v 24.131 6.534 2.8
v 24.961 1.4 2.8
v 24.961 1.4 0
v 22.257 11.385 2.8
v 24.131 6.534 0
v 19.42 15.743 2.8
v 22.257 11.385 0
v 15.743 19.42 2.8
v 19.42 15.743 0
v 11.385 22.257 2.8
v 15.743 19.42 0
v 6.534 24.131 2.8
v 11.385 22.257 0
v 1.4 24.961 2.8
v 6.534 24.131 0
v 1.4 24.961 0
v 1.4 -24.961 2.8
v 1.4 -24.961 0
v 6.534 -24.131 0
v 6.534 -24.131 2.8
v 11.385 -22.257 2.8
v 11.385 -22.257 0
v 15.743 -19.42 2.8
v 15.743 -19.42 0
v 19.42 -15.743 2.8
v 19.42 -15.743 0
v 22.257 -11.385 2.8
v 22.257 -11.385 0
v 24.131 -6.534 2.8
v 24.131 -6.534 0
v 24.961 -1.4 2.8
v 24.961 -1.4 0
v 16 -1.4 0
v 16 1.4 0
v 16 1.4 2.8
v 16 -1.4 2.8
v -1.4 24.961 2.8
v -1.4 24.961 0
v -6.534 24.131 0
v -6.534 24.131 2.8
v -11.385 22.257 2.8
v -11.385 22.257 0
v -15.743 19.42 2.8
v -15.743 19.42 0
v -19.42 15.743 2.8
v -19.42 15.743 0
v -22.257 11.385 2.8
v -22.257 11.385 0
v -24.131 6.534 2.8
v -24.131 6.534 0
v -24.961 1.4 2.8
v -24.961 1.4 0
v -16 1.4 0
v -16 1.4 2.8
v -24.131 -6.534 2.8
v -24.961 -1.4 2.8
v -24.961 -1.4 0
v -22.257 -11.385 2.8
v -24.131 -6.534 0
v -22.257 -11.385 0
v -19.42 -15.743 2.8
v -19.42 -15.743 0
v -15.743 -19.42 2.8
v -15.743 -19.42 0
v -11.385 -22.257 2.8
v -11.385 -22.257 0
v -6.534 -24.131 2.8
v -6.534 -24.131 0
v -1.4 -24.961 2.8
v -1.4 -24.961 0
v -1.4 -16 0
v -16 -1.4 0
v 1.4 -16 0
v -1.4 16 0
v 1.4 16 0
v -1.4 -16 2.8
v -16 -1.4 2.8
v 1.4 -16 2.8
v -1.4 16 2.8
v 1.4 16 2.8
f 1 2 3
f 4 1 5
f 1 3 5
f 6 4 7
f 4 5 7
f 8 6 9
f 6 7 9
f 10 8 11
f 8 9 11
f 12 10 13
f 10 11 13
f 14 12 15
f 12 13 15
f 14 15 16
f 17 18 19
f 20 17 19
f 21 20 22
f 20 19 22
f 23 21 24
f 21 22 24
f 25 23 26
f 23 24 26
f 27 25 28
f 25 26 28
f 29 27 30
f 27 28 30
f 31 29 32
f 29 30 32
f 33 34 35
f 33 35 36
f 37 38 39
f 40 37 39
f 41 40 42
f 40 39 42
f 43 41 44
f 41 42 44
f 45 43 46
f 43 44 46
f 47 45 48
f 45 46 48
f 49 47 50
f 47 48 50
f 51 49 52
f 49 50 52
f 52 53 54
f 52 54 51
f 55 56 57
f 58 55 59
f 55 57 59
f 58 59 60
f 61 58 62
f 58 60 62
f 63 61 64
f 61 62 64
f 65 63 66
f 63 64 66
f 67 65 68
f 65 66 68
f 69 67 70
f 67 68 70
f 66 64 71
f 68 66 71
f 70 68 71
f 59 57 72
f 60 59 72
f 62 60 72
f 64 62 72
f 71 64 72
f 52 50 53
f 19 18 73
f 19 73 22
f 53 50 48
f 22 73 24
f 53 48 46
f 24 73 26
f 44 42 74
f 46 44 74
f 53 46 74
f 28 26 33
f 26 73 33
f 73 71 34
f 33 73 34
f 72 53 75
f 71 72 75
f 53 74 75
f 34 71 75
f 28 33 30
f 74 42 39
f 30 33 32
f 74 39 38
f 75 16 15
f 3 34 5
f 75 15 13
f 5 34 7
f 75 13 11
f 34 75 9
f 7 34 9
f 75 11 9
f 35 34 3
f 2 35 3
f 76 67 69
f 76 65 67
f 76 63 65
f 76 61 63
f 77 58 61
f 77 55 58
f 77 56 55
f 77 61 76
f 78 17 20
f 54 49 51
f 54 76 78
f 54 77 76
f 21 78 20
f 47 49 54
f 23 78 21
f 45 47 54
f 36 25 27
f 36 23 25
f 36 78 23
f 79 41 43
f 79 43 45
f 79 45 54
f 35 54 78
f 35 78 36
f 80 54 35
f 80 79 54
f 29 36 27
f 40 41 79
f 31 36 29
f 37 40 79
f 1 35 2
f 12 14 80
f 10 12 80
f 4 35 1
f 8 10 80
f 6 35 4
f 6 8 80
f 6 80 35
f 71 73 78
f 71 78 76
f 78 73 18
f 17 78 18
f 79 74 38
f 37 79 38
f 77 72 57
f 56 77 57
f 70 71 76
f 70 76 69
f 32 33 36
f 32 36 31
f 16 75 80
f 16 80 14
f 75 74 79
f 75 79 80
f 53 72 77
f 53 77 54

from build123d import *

# Parameters (mm, degrees)
CROQUIS1_R              = 25
SALIENTE_EXTRUIR1_DEPTH = 2.8
CROQUIS2_W              = 2.8
CROQUIS2_H              = 18
CORTAR_EXTRUIR1_DEPTH   = 3.8
MATRIZC1_COUNT          = 4


with BuildPart() as part:
    # Croquis1 → Saliente-Extruir1 (new body)
    with BuildSketch(Plane.XY):
        Circle(CROQUIS1_R)
    extrude(amount=SALIENTE_EXTRUIR1_DEPTH)

    # Croquis2 → Cortar-Extruir1 (cut, through all)
    with BuildSketch(Plane.XY):
        with Locations((0, 25)):
            Rectangle(CROQUIS2_W, CROQUIS2_H)
    cortar_extruir1 = extrude(amount=CORTAR_EXTRUIR1_DEPTH, mode=Mode.SUBTRACT)

    # MatrizC1: Cortar-Extruir1 ×4 about axis
    matrizc1_axis = Axis((0, 0, 0), (0, 0, 1))
    for i in range(1, MATRIZC1_COUNT):
        add(cortar_extruir1.rotate(matrizc1_axis, i * 360 / MATRIZC1_COUNT), mode=Mode.SUBTRACT)


solid = part.part
